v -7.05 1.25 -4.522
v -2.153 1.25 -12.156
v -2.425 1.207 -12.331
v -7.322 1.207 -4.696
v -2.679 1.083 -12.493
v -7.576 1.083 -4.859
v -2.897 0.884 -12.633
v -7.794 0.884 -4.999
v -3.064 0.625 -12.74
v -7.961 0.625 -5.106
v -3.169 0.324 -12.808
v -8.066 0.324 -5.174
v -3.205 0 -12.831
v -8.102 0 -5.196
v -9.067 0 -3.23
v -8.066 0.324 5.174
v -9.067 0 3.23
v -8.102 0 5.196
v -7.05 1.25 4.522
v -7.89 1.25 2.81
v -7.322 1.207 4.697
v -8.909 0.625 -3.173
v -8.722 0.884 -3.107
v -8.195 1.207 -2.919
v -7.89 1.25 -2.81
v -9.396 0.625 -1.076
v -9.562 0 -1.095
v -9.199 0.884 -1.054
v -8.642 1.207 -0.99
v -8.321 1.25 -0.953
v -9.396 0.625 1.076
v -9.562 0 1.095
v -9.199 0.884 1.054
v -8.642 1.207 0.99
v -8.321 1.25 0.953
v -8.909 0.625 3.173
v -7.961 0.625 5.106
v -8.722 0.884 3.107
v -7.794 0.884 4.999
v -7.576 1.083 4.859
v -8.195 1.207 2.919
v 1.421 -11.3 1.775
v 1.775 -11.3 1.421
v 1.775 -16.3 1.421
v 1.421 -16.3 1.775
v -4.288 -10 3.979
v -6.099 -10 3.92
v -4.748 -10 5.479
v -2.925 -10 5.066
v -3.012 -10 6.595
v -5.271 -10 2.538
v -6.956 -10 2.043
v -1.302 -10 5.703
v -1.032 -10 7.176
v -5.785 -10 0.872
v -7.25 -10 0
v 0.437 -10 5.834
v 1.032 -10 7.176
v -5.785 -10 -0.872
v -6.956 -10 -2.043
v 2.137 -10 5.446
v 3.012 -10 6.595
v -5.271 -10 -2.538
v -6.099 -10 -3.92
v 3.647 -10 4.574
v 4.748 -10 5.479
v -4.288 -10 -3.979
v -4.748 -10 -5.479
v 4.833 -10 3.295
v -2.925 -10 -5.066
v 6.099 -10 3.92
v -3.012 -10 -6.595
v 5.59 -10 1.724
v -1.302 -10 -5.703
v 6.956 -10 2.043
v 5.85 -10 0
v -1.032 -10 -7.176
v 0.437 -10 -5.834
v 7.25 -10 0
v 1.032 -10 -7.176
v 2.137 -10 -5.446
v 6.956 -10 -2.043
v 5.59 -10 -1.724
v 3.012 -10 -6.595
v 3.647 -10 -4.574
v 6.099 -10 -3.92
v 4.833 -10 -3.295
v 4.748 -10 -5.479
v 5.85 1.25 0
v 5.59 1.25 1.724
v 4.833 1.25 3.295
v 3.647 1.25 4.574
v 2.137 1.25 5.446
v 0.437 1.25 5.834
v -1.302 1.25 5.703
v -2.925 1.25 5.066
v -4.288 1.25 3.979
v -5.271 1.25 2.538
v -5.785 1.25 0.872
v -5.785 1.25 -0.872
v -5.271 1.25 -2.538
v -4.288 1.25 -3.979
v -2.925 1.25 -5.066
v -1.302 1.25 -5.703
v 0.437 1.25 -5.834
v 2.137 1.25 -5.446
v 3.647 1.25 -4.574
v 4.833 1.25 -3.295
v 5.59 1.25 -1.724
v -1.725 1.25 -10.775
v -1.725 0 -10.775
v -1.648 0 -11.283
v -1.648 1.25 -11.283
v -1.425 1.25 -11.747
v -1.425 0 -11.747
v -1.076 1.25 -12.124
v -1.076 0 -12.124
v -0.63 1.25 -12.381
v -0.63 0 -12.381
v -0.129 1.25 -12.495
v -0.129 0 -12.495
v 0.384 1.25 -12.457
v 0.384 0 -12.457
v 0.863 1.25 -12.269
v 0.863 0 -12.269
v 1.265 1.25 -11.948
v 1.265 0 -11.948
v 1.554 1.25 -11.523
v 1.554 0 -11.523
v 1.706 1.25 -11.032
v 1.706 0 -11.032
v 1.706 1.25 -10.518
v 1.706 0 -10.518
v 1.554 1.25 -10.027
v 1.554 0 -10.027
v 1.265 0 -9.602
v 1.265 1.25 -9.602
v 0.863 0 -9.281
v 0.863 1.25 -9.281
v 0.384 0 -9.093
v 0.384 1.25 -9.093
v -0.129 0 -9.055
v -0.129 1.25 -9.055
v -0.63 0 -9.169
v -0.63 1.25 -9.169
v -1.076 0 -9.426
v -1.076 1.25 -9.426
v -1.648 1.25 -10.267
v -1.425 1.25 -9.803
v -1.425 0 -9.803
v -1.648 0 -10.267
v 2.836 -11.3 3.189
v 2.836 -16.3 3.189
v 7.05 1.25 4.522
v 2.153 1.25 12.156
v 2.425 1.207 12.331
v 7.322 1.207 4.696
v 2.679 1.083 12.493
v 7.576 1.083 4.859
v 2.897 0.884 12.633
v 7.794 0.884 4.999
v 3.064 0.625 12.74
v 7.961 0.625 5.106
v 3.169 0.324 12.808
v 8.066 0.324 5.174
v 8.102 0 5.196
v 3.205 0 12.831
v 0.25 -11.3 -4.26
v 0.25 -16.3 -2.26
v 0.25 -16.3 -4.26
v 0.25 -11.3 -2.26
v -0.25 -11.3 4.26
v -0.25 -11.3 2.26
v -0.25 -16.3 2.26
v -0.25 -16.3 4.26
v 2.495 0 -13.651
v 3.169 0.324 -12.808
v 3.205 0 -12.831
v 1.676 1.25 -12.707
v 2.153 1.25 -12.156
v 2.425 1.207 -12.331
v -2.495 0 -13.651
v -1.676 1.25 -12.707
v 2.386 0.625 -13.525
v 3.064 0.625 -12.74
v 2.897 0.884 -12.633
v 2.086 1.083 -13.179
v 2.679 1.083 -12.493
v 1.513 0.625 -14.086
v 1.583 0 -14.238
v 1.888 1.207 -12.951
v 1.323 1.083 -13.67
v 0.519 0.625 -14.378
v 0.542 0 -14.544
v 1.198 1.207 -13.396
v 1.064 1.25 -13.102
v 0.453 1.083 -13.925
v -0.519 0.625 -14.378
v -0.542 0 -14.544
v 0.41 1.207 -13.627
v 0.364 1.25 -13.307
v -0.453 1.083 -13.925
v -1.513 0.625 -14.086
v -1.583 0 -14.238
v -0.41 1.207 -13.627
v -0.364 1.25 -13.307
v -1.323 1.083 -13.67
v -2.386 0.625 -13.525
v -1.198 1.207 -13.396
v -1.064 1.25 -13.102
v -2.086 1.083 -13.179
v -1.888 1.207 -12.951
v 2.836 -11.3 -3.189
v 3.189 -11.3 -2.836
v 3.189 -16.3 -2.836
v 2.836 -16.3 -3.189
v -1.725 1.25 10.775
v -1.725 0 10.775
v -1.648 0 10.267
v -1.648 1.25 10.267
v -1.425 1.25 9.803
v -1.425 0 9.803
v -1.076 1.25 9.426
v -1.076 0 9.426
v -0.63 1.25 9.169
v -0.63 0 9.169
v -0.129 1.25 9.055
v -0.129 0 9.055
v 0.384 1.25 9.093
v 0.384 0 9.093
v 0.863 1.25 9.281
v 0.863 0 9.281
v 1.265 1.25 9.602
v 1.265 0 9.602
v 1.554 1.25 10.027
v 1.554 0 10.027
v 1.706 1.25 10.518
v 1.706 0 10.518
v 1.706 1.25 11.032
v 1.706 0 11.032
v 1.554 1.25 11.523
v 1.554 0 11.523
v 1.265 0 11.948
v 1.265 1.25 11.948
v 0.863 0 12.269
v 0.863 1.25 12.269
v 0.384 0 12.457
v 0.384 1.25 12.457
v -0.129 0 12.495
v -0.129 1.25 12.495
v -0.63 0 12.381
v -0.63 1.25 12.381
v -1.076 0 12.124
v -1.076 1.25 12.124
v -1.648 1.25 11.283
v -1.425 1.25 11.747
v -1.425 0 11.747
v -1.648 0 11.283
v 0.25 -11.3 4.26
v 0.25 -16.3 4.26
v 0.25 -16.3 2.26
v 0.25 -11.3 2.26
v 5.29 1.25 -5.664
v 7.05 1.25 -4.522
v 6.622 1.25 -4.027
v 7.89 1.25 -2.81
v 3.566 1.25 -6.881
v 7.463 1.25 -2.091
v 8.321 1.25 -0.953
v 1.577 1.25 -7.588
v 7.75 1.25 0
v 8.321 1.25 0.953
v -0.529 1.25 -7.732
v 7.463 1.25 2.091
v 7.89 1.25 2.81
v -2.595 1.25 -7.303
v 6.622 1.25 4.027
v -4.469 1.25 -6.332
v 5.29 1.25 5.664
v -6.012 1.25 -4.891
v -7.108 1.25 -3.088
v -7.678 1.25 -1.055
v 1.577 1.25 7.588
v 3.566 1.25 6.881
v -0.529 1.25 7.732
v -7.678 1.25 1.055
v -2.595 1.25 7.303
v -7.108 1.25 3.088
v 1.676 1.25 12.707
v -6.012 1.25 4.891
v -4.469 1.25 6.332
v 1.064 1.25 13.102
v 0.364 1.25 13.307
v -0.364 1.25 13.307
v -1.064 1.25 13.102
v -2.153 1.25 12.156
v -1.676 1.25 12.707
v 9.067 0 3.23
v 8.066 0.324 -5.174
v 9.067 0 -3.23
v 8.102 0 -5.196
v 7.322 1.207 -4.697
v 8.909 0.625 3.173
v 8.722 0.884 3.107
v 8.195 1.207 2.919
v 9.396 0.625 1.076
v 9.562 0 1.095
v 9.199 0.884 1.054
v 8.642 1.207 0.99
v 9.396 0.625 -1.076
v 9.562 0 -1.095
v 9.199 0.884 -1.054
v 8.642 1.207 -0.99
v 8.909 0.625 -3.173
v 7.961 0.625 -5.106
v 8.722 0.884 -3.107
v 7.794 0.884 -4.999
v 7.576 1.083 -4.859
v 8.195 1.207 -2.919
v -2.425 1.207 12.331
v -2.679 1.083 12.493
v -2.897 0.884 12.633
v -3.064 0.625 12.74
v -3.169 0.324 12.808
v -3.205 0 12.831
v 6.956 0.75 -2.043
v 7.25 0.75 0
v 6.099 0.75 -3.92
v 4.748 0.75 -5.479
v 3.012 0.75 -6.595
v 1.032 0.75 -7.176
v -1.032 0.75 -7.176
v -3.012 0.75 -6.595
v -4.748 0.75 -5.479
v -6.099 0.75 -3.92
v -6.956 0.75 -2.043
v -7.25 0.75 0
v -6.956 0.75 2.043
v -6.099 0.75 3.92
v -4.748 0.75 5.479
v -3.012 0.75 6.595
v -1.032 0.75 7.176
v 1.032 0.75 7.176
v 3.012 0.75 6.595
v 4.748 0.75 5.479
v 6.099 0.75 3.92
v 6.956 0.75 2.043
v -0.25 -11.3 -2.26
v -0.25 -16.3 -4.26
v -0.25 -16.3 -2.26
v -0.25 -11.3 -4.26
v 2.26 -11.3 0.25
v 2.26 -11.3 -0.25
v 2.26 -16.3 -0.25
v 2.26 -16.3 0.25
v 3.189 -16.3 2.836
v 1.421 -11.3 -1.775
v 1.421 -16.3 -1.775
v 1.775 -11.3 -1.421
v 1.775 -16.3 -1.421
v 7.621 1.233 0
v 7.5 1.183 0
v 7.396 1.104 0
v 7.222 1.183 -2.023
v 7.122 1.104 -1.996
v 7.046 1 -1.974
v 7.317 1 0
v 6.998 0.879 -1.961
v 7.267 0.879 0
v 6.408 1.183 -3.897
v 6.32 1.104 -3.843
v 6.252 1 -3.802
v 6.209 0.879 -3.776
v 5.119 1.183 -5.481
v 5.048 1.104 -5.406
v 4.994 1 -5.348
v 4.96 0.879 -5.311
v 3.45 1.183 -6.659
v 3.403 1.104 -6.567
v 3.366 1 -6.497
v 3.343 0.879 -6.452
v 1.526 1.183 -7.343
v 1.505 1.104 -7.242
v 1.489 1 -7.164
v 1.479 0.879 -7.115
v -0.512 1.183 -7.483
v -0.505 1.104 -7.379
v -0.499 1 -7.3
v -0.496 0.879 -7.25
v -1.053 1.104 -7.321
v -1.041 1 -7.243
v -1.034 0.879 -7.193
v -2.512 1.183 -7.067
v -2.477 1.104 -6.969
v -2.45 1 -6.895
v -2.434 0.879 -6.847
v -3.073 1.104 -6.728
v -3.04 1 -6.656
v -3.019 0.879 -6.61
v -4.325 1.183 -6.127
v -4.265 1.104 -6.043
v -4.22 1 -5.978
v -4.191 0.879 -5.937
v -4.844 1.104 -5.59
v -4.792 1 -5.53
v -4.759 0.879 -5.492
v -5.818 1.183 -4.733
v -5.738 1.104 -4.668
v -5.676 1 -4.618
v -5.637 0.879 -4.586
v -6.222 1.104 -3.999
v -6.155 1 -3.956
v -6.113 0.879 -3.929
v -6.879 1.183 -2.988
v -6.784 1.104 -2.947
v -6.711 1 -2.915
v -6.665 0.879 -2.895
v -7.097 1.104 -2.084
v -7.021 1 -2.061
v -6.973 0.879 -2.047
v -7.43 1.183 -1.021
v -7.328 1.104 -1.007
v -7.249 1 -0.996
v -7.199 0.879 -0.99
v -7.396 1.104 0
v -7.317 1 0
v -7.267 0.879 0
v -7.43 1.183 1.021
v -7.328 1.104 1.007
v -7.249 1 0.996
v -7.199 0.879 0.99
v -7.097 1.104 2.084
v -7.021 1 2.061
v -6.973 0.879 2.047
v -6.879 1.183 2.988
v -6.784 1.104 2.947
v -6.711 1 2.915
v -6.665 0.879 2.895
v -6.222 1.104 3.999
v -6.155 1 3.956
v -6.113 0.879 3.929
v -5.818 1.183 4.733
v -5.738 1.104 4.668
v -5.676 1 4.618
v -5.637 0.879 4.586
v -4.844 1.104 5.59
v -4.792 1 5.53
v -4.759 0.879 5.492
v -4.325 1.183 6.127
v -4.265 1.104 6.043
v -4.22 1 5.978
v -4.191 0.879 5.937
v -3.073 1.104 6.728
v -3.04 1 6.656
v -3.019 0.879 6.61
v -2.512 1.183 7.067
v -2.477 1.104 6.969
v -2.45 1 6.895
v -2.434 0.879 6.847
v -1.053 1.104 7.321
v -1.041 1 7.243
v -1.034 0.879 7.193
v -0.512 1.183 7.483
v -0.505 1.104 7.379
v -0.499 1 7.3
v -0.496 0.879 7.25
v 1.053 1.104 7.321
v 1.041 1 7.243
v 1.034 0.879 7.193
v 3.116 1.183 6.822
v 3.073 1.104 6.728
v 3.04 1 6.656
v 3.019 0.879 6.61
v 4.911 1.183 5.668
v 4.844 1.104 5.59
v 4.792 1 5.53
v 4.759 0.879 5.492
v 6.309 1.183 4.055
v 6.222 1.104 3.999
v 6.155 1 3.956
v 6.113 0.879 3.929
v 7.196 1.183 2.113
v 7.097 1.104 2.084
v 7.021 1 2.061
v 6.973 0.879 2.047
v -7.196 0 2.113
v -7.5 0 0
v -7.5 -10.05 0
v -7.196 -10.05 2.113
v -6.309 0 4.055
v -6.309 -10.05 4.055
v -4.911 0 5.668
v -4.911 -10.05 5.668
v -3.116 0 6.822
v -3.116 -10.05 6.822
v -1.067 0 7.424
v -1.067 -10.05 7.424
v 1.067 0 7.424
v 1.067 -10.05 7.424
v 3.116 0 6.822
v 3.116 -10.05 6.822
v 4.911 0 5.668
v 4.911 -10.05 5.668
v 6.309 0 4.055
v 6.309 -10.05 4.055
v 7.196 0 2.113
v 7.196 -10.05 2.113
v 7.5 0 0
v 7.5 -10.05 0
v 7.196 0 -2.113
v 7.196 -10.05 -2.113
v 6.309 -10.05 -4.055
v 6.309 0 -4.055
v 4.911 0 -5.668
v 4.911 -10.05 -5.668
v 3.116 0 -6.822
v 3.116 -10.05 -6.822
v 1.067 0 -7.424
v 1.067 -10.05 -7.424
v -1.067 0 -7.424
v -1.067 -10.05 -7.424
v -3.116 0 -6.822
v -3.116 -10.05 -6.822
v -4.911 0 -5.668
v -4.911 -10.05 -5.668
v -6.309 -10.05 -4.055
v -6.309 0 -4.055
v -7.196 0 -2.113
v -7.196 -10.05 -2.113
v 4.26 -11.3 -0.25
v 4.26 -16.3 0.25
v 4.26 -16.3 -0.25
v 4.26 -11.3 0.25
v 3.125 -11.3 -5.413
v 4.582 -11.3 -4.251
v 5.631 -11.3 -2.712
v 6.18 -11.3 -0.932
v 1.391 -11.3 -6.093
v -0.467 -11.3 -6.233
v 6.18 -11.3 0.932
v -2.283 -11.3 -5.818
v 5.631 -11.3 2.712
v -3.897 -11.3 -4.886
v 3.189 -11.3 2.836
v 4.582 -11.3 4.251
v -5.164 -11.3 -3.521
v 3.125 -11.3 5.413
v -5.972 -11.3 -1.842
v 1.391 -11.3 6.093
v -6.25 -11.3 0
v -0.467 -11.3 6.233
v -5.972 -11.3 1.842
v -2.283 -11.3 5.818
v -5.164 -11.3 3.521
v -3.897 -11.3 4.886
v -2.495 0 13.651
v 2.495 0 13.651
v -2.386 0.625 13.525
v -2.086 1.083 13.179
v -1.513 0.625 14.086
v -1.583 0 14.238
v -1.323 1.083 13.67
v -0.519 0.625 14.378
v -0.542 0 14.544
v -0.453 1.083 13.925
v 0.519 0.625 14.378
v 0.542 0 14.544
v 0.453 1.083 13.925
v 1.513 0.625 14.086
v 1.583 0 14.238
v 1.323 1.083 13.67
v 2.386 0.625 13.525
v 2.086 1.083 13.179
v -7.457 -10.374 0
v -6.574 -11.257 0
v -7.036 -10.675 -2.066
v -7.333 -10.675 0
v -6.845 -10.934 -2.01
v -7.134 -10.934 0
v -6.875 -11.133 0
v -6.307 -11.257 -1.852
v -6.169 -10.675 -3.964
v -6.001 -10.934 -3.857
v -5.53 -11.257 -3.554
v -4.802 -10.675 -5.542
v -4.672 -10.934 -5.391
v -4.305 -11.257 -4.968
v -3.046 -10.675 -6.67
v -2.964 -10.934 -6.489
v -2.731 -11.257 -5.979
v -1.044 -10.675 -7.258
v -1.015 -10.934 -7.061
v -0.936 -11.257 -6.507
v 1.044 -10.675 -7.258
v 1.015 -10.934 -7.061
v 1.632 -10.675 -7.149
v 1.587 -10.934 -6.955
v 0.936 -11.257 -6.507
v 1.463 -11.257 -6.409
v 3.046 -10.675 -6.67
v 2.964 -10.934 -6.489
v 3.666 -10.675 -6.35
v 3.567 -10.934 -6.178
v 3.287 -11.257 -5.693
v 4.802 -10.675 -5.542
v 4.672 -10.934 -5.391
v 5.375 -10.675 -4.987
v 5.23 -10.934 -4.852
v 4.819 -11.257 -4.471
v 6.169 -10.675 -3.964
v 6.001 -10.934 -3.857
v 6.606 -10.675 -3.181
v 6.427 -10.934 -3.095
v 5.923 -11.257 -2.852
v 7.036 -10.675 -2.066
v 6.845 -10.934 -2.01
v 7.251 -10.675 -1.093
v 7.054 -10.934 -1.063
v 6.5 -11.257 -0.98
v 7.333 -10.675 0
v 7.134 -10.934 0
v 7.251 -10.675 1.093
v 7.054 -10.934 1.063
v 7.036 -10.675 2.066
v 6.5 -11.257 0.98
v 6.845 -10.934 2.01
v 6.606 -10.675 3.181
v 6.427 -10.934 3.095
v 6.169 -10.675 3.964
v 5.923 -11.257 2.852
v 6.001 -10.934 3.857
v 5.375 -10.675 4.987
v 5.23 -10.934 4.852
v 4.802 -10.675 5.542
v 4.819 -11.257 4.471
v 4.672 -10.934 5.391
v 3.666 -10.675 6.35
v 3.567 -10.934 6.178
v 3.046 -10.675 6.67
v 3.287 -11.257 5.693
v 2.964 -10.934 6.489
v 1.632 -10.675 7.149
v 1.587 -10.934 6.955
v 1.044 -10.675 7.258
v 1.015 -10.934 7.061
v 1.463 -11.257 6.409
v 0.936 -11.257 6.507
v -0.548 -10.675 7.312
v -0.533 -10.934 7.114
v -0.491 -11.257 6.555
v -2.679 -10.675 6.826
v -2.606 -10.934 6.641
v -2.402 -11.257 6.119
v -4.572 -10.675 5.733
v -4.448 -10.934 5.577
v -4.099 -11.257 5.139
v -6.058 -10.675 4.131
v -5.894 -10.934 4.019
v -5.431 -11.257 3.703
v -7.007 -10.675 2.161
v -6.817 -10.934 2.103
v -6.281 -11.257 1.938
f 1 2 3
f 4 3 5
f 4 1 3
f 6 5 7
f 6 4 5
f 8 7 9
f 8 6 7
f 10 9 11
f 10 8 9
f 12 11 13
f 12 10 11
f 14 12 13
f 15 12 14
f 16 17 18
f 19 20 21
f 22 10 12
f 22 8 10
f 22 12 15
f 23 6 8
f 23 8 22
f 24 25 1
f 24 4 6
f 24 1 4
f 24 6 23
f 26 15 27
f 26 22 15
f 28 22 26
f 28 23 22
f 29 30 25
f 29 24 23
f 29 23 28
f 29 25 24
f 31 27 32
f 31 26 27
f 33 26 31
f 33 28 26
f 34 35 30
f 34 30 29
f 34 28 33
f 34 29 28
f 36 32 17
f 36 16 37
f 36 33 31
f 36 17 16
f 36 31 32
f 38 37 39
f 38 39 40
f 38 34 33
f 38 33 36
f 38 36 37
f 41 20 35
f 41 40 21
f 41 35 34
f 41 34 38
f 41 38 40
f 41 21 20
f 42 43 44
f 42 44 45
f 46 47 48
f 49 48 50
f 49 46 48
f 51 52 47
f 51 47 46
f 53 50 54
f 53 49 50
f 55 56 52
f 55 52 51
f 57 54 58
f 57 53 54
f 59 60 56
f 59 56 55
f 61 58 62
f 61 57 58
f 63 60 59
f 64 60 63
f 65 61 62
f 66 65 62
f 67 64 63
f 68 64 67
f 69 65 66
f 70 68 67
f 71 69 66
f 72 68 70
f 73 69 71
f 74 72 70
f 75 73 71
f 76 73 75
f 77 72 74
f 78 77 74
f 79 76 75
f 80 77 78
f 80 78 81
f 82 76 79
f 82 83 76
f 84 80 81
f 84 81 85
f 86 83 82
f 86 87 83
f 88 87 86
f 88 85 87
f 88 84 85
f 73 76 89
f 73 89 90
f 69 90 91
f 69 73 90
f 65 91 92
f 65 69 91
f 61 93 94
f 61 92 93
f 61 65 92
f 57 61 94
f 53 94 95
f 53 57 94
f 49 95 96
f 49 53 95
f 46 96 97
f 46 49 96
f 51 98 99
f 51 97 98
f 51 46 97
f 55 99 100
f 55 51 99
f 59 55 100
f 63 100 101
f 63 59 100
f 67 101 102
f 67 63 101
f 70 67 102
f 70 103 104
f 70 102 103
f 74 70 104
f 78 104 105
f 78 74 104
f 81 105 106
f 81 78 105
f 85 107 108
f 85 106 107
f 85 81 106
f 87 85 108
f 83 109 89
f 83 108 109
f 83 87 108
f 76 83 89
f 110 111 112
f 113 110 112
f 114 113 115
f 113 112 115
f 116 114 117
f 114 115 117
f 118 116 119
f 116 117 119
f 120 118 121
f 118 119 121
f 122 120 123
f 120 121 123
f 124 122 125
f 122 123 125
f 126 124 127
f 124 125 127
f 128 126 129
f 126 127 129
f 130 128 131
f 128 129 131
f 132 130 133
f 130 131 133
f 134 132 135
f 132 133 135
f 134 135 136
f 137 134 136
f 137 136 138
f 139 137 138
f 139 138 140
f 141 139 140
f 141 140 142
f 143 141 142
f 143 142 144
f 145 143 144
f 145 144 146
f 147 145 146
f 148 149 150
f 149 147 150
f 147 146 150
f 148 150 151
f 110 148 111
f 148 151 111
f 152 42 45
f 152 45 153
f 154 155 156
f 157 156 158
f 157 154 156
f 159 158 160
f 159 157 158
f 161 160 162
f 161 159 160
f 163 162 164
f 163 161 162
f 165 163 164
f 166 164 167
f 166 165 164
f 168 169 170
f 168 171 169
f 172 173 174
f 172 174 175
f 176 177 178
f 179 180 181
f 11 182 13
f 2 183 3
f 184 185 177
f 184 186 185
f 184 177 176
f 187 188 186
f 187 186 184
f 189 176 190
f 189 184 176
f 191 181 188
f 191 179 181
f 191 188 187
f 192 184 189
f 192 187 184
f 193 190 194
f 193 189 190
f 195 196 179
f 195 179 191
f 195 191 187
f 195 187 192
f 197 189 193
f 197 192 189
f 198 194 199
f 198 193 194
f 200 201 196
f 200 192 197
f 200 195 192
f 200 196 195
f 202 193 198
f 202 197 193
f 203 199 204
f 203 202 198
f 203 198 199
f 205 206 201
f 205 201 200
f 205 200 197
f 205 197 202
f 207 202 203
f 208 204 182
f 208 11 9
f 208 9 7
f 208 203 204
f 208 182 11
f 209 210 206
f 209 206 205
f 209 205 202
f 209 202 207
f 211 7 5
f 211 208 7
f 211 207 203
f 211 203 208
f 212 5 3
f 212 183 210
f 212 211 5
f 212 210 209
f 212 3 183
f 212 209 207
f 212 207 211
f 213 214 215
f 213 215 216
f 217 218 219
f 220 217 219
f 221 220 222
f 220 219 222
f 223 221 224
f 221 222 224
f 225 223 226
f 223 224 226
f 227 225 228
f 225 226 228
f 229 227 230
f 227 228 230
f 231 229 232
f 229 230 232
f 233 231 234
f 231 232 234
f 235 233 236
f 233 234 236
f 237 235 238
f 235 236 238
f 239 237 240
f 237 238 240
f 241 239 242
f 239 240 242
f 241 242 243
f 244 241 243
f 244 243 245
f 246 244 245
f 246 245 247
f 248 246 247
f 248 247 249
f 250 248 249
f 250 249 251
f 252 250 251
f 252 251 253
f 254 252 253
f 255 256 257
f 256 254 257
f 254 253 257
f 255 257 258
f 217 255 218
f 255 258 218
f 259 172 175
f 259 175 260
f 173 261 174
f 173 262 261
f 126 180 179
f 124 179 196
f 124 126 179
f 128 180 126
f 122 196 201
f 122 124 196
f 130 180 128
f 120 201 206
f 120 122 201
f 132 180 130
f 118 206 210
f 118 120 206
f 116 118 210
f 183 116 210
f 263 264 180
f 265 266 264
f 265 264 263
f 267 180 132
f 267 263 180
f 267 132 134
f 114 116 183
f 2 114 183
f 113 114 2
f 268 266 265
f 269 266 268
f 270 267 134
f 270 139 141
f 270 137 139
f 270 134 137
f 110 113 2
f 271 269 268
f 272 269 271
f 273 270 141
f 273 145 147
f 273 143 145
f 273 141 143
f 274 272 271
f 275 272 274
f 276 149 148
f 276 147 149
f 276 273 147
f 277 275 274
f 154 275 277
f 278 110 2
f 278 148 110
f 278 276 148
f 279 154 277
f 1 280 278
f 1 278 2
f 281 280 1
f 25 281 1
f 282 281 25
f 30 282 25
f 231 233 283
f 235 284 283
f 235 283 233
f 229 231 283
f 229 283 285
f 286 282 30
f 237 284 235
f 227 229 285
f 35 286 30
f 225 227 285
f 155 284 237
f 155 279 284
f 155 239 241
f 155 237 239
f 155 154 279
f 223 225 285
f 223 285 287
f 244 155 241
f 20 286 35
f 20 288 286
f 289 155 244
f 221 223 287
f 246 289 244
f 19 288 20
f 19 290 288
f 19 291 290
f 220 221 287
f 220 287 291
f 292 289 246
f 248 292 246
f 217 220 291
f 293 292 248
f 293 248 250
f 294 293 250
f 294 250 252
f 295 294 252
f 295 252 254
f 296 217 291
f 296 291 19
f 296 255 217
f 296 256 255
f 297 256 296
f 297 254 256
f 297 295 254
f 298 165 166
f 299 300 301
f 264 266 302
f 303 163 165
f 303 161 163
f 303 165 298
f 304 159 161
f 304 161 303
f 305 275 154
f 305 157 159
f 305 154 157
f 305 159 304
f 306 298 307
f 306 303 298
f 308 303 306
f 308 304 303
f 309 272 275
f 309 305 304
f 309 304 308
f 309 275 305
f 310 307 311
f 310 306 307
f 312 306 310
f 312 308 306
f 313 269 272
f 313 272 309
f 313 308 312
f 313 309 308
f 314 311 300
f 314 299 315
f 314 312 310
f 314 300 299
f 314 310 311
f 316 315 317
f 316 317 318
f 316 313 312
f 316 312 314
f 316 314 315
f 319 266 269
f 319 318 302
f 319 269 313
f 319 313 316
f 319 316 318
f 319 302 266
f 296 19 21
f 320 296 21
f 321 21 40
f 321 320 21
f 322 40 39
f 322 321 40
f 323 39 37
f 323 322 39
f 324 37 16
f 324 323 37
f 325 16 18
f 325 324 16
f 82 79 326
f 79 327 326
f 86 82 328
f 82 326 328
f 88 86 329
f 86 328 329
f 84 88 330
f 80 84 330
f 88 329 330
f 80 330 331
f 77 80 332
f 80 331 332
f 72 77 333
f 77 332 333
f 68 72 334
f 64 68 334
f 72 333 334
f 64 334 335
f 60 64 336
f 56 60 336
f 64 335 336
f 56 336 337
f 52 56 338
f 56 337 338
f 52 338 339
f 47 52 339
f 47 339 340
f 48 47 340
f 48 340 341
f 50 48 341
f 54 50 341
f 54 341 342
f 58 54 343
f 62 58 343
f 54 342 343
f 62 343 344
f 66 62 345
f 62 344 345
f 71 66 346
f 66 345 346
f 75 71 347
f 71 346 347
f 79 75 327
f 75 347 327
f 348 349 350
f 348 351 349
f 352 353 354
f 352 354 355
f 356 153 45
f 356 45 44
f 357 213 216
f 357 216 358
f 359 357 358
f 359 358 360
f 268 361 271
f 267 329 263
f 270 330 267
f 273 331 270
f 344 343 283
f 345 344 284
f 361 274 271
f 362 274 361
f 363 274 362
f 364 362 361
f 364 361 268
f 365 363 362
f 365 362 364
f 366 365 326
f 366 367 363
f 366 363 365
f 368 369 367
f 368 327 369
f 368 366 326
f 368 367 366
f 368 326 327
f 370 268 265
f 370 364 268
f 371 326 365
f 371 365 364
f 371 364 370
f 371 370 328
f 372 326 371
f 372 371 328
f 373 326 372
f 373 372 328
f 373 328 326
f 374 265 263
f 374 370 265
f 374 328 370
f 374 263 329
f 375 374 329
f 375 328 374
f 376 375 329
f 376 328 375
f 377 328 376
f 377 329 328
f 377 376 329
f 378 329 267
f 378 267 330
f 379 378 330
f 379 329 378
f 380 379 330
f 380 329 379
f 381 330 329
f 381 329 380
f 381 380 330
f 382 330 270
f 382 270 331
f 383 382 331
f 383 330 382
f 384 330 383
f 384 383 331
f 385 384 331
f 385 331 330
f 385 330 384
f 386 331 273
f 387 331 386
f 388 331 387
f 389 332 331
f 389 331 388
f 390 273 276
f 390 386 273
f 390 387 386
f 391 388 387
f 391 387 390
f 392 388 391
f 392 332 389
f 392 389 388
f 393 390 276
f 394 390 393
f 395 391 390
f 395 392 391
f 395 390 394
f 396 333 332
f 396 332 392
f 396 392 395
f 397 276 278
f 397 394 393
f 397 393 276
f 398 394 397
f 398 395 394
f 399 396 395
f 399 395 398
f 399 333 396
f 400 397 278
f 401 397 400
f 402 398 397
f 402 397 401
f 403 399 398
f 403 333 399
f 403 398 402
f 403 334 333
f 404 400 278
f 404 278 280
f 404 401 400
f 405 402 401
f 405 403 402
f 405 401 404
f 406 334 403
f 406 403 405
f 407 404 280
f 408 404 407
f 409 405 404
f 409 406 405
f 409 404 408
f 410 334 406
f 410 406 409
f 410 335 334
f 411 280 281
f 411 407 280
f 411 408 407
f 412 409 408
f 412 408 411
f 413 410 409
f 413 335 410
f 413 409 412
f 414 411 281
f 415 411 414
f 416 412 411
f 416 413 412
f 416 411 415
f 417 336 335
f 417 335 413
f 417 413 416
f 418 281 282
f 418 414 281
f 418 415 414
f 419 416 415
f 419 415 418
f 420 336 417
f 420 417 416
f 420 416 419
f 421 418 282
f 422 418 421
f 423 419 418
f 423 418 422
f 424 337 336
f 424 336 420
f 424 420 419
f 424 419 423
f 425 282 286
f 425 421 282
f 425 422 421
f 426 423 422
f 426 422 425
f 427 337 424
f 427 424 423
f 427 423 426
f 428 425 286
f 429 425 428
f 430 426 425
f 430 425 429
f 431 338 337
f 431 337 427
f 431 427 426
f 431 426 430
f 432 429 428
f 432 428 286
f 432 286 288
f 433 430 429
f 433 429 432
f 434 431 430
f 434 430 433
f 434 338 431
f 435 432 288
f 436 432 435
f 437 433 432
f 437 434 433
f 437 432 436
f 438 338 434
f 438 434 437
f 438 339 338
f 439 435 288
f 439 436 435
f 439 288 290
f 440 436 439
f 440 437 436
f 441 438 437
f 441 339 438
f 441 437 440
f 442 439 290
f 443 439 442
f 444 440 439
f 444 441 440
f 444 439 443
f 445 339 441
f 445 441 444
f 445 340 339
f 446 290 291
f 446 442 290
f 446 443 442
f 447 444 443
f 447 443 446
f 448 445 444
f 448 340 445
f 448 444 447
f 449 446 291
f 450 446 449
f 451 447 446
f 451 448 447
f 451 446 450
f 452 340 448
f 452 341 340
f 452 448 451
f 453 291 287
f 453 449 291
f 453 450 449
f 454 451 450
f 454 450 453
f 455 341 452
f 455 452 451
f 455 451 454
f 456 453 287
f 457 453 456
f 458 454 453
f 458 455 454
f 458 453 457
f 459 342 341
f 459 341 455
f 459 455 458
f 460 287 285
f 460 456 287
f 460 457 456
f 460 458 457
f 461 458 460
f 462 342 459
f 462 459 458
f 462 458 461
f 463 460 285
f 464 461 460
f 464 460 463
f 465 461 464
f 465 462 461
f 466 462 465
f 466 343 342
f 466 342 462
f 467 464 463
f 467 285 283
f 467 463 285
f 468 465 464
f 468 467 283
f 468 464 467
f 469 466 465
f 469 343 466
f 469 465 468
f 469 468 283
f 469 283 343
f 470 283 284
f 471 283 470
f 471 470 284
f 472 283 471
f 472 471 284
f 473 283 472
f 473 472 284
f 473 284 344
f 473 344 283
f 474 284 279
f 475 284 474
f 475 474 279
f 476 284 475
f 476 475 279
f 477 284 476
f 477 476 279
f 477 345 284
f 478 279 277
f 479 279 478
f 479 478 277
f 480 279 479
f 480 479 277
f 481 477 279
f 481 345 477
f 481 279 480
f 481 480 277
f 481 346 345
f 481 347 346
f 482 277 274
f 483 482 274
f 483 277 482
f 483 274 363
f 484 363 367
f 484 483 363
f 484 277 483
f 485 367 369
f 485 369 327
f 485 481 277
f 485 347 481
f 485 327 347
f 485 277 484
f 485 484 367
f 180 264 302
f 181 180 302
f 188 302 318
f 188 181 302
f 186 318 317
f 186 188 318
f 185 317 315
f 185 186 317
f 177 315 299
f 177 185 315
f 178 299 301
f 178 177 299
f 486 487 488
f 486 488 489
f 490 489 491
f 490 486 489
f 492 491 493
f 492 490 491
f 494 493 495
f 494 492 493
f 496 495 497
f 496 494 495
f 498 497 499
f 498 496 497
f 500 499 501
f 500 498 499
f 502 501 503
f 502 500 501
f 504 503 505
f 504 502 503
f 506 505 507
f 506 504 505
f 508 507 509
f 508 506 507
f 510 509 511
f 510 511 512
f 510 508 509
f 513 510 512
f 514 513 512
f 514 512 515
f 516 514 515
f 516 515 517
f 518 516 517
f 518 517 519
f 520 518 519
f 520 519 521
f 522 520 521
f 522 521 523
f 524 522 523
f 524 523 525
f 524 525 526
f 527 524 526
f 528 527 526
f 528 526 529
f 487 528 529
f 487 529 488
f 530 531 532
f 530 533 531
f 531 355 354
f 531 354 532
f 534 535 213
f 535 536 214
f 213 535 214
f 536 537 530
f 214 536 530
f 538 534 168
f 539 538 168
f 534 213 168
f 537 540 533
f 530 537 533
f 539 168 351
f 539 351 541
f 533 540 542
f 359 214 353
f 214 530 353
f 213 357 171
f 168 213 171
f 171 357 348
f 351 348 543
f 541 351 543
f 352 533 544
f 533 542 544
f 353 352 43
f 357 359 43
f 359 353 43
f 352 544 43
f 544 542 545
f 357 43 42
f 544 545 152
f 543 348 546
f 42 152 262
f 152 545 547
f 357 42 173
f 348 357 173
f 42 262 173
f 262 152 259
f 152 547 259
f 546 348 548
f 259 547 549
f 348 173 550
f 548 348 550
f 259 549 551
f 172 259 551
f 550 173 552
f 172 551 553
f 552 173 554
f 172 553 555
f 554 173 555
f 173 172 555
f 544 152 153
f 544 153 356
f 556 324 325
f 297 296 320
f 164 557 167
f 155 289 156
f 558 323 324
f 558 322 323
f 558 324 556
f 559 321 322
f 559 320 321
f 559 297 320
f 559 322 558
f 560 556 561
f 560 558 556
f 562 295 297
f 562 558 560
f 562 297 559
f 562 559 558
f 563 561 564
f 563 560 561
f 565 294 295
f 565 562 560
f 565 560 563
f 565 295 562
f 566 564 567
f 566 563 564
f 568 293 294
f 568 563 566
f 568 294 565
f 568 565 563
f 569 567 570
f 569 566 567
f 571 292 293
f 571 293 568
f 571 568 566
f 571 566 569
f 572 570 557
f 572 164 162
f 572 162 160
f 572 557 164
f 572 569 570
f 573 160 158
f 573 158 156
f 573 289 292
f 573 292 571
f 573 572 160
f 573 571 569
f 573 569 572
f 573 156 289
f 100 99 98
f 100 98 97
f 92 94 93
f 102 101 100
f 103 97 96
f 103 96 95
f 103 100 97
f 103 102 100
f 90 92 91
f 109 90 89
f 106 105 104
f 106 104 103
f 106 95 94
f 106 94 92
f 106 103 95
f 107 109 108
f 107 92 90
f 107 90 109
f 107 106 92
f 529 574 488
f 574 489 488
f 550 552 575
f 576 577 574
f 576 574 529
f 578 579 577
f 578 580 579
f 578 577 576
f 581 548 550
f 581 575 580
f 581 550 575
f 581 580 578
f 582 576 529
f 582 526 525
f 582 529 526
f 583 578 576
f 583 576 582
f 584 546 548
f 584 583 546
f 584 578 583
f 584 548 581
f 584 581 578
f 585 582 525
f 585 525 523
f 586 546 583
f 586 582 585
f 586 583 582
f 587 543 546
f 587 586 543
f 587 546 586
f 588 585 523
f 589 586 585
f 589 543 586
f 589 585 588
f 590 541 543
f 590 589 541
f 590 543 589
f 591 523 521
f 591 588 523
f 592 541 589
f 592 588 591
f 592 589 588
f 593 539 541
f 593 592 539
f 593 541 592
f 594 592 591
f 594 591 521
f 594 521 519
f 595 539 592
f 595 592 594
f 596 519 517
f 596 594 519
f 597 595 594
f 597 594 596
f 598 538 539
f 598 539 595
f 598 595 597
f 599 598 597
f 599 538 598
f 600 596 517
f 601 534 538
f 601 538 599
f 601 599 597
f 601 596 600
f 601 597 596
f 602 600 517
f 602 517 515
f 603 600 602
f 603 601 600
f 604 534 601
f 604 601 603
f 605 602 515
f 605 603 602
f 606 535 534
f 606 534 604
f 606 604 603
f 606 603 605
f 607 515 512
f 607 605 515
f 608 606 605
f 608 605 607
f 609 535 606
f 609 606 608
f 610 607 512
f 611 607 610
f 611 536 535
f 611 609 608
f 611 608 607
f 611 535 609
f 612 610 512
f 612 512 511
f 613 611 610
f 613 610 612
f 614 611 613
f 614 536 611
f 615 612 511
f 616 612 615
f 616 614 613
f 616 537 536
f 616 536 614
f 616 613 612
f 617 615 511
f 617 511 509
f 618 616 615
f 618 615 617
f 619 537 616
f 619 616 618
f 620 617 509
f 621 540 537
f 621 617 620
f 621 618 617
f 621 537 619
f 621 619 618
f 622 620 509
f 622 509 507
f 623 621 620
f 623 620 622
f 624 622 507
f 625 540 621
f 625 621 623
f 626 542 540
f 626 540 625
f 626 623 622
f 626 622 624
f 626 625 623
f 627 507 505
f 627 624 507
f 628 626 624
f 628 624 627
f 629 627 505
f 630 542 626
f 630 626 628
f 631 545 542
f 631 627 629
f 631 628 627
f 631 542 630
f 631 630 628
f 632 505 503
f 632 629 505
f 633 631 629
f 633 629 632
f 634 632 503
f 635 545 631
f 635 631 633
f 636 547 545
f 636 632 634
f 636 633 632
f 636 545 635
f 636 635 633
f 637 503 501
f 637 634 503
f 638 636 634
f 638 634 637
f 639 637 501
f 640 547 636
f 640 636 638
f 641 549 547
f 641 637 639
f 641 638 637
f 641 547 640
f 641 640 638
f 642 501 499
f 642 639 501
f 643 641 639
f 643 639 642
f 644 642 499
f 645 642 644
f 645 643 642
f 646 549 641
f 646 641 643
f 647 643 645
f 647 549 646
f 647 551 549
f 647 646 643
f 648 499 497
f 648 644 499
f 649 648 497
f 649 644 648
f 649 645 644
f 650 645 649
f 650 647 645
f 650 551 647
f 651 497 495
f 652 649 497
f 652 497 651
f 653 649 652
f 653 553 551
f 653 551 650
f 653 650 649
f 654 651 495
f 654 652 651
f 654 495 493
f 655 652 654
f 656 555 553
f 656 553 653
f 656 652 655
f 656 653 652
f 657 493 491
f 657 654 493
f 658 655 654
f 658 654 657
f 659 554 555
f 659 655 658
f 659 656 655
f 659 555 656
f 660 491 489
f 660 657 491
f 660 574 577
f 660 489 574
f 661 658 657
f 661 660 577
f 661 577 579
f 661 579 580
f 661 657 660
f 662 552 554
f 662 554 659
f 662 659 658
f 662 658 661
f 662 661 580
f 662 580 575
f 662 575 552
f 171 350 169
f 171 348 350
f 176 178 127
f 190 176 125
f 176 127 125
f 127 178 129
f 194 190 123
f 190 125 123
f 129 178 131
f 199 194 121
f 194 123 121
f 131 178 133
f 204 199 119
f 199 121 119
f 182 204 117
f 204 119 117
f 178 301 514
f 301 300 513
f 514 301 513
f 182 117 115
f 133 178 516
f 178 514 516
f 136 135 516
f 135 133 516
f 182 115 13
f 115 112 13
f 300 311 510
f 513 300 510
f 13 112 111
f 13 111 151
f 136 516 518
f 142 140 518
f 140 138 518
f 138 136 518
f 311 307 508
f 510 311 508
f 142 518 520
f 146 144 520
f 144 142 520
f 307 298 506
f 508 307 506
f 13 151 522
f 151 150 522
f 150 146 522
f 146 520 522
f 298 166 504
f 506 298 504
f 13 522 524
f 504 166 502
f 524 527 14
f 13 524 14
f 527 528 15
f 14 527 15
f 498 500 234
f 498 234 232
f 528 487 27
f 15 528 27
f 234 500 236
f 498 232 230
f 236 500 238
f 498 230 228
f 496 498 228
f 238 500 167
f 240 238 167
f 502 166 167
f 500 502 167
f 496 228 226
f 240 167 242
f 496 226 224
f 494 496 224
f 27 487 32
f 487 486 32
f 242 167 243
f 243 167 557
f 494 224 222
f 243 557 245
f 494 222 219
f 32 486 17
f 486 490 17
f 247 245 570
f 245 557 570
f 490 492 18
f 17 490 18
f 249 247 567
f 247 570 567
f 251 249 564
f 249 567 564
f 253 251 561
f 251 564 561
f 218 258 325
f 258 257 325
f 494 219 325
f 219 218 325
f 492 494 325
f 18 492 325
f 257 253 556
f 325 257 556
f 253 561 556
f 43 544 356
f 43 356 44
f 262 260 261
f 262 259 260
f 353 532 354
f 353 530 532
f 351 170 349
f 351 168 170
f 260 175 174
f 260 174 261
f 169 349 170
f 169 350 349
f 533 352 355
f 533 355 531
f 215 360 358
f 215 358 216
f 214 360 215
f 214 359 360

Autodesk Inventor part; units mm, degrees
ref_plane "YZ Plane" through (0, 0, 0) normal (1, 0, 0) x (0, 1, 0)
ref_plane "XZ Plane" through (0, 0, 0) normal (0, 1, 0) x (-1, 0, 0)
ref_plane "XY Plane" through (0, 0, 0) normal (0, 0, 1) x (1, 0, 0)
sketch "Sketch1" plane through (0, 0, 0) normal (0, 1, 0) x (-1, 0, 0)
  circle A0 centre (0, 0) radius 7.5
  circle A1 centre (0, -10.775) radius 1.725
  circle A2 centre (0, 10.775) radius 1.725
  line L0 (8.1017, 5.1965) -> (3.205, 12.8307)
  line L1 (-3.205, 12.8307) -> (-8.1017, 5.1965)
  line L2 (-8.1017, -5.1965) -> (-3.205, -12.8307)
  line L3 (3.205, -12.8307) -> (8.1017, -5.1965)
  line L4 (0, -20) -> (0, 18) construction
  arc A3 (-3.205, -12.8307) -> (3.205, -12.8307) centre (0, -10.775) ccw
  arc A4 (8.1017, -5.1965) -> (8.1017, 5.1965) centre (0, 0) ccw
  arc A5 (-8.1017, 5.1965) -> (-8.1017, -5.1965) centre (0, 0) ccw
  arc A6 (3.205, 12.8307) -> (-3.205, 12.8307) centre (0, 10.775) ccw
  dimension "d0" = 15
  dimension "d2" = 3.45
  dimension "d4" = 10.775
  dimension "d8" = 3.45
  dimension "d9" = 10.775
  dimension "d34" = 9.625
  dimension "d35" = 9.625
extrude "Extrusion1" add sketch "Sketch1" along normal blind 1.25 contours A0 | A4 L3 A3 L2 A5 L1 A6 L0
fillet "Fillet1" radius 1.25 8 edges at (5.6534, 1.25, 9.0136) (9.625, 1.25, 0) (5.6534, 1.25, -9.0136) (0, 1.25, -14.5826) (-5.6534, 1.25, -9.0136) (-9.625, 1.25, 0) (-5.6534, 1.25, 9.0136) (0, 1.25, 14.5826)
extrude "Extrusion2" add sketch "Sketch1" against normal blind 11.3 contours A0
fillet "Fillet2" radius 1.25 1 edges at (7.5, -11.3, 0)
sketch "Sketch2" plane through (0, -11.3, 0) normal (0, -1, 0) x (1, 0, 0)
  circle A0 centre (0, 0) radius 3.26 construction
  line L0 (-0.25, -2.26) -> (0.25, -2.26)
  line L1 (0.25, -2.26) -> (0.25, -4.26)
  line L2 (0.25, -4.26) -> (-0.25, -4.26)
  line L3 (-0.25, -4.26) -> (-0.25, -2.26)
  line L4 (-0.25, -2.26) -> (0.25, -4.26) construction
  line L5 (0.25, -2.26) -> (-0.25, -4.26) construction
  circle A1 centre (0, 0) radius 3.26 construction
  line L6 (1.4213, -1.7748) -> (1.7748, -1.4213)
  line L7 (1.7748, -1.4213) -> (3.1891, -2.8355)
  line L8 (3.1891, -2.8355) -> (2.8355, -3.1891)
  line L9 (2.8355, -3.1891) -> (1.4213, -1.7748)
  line L10 (1.4213, -1.7748) -> (3.1891, -2.8355) construction
  line L11 (1.7748, -1.4213) -> (2.8355, -3.1891) construction
  circle A2 centre (0, 0) radius 3.26 construction
  line L12 (2.26, -0.25) -> (2.26, 0.25)
  line L13 (2.26, 0.25) -> (4.26, 0.25)
  line L14 (4.26, 0.25) -> (4.26, -0.25)
  line L15 (4.26, -0.25) -> (2.26, -0.25)
  line L16 (2.26, -0.25) -> (4.26, 0.25) construction
  line L17 (2.26, 0.25) -> (4.26, -0.25) construction
  circle A3 centre (0, 0) radius 3.26 construction
  line L18 (1.7748, 1.4213) -> (1.4213, 1.7748)
  line L19 (1.4213, 1.7748) -> (2.8355, 3.1891)
  line L20 (2.8355, 3.1891) -> (3.1891, 2.8355)
  line L21 (3.1891, 2.8355) -> (1.7748, 1.4213)
  line L22 (1.7748, 1.4213) -> (2.8355, 3.1891) construction
  line L23 (1.4213, 1.7748) -> (3.1891, 2.8355) construction
  circle A4 centre (0, 0) radius 3.26 construction
  line L24 (0.25, 2.26) -> (-0.25, 2.26)
  line L25 (-0.25, 2.26) -> (-0.25, 4.26)
  line L26 (-0.25, 4.26) -> (0.25, 4.26)
  line L27 (0.25, 4.26) -> (0.25, 2.26)
  line L28 (0.25, 2.26) -> (-0.25, 4.26) construction
  line L29 (-0.25, 2.26) -> (0.25, 4.26) construction
  point P0 (0, -3.26)
  point P1 (2.3052, -2.3052)
  point P2 (3.26, 0)
  point P3 (2.3052, 2.3052)
  point P4 (0, 3.26)
  dimension "d16" = 6.52
  dimension "d19" = 0.5
  dimension "d20" = 2
  dimension "d23" = 180
extrude "Extrusion3" add sketch "Sketch2" along normal blind 5
sketch "Sketch3" plane through (0, 1.25, 0) normal (0, 1, 0) x (1, 0, 0)
  arc A0 (-7.0495, 4.5216) -> (-7.0495, -4.5216) centre (0, 0) ccw projected
  circle A1 centre (0, 0) radius 7.25
  dimension "d27" = 14.5
extrude "Extrusion4" cut sketch "Sketch3" against normal blind 11.25
sketch "Sketch4" plane through (0, -10, 0) normal (0, 1, 0) x (1, 0, 0)
  circle A0 centre (0, 0) radius 5.85
  dimension "d30" = 11.7
extrude "Extrusion5" add sketch "Sketch4" along normal up to surface (11.25 mm away)
fillet "Fillet3" radius 0.5 1 edges at (-7.25, 1.25, 0)
equation "\"d8\" = d2"
equation "\"d9\" = d4"
equation "\"d35\" = d34"
equation "\"d12\" = d10"
equation "\"d15\" = d10"
equation "\"d10\" = 1.25"
properties part number "midi_gniazdo"
